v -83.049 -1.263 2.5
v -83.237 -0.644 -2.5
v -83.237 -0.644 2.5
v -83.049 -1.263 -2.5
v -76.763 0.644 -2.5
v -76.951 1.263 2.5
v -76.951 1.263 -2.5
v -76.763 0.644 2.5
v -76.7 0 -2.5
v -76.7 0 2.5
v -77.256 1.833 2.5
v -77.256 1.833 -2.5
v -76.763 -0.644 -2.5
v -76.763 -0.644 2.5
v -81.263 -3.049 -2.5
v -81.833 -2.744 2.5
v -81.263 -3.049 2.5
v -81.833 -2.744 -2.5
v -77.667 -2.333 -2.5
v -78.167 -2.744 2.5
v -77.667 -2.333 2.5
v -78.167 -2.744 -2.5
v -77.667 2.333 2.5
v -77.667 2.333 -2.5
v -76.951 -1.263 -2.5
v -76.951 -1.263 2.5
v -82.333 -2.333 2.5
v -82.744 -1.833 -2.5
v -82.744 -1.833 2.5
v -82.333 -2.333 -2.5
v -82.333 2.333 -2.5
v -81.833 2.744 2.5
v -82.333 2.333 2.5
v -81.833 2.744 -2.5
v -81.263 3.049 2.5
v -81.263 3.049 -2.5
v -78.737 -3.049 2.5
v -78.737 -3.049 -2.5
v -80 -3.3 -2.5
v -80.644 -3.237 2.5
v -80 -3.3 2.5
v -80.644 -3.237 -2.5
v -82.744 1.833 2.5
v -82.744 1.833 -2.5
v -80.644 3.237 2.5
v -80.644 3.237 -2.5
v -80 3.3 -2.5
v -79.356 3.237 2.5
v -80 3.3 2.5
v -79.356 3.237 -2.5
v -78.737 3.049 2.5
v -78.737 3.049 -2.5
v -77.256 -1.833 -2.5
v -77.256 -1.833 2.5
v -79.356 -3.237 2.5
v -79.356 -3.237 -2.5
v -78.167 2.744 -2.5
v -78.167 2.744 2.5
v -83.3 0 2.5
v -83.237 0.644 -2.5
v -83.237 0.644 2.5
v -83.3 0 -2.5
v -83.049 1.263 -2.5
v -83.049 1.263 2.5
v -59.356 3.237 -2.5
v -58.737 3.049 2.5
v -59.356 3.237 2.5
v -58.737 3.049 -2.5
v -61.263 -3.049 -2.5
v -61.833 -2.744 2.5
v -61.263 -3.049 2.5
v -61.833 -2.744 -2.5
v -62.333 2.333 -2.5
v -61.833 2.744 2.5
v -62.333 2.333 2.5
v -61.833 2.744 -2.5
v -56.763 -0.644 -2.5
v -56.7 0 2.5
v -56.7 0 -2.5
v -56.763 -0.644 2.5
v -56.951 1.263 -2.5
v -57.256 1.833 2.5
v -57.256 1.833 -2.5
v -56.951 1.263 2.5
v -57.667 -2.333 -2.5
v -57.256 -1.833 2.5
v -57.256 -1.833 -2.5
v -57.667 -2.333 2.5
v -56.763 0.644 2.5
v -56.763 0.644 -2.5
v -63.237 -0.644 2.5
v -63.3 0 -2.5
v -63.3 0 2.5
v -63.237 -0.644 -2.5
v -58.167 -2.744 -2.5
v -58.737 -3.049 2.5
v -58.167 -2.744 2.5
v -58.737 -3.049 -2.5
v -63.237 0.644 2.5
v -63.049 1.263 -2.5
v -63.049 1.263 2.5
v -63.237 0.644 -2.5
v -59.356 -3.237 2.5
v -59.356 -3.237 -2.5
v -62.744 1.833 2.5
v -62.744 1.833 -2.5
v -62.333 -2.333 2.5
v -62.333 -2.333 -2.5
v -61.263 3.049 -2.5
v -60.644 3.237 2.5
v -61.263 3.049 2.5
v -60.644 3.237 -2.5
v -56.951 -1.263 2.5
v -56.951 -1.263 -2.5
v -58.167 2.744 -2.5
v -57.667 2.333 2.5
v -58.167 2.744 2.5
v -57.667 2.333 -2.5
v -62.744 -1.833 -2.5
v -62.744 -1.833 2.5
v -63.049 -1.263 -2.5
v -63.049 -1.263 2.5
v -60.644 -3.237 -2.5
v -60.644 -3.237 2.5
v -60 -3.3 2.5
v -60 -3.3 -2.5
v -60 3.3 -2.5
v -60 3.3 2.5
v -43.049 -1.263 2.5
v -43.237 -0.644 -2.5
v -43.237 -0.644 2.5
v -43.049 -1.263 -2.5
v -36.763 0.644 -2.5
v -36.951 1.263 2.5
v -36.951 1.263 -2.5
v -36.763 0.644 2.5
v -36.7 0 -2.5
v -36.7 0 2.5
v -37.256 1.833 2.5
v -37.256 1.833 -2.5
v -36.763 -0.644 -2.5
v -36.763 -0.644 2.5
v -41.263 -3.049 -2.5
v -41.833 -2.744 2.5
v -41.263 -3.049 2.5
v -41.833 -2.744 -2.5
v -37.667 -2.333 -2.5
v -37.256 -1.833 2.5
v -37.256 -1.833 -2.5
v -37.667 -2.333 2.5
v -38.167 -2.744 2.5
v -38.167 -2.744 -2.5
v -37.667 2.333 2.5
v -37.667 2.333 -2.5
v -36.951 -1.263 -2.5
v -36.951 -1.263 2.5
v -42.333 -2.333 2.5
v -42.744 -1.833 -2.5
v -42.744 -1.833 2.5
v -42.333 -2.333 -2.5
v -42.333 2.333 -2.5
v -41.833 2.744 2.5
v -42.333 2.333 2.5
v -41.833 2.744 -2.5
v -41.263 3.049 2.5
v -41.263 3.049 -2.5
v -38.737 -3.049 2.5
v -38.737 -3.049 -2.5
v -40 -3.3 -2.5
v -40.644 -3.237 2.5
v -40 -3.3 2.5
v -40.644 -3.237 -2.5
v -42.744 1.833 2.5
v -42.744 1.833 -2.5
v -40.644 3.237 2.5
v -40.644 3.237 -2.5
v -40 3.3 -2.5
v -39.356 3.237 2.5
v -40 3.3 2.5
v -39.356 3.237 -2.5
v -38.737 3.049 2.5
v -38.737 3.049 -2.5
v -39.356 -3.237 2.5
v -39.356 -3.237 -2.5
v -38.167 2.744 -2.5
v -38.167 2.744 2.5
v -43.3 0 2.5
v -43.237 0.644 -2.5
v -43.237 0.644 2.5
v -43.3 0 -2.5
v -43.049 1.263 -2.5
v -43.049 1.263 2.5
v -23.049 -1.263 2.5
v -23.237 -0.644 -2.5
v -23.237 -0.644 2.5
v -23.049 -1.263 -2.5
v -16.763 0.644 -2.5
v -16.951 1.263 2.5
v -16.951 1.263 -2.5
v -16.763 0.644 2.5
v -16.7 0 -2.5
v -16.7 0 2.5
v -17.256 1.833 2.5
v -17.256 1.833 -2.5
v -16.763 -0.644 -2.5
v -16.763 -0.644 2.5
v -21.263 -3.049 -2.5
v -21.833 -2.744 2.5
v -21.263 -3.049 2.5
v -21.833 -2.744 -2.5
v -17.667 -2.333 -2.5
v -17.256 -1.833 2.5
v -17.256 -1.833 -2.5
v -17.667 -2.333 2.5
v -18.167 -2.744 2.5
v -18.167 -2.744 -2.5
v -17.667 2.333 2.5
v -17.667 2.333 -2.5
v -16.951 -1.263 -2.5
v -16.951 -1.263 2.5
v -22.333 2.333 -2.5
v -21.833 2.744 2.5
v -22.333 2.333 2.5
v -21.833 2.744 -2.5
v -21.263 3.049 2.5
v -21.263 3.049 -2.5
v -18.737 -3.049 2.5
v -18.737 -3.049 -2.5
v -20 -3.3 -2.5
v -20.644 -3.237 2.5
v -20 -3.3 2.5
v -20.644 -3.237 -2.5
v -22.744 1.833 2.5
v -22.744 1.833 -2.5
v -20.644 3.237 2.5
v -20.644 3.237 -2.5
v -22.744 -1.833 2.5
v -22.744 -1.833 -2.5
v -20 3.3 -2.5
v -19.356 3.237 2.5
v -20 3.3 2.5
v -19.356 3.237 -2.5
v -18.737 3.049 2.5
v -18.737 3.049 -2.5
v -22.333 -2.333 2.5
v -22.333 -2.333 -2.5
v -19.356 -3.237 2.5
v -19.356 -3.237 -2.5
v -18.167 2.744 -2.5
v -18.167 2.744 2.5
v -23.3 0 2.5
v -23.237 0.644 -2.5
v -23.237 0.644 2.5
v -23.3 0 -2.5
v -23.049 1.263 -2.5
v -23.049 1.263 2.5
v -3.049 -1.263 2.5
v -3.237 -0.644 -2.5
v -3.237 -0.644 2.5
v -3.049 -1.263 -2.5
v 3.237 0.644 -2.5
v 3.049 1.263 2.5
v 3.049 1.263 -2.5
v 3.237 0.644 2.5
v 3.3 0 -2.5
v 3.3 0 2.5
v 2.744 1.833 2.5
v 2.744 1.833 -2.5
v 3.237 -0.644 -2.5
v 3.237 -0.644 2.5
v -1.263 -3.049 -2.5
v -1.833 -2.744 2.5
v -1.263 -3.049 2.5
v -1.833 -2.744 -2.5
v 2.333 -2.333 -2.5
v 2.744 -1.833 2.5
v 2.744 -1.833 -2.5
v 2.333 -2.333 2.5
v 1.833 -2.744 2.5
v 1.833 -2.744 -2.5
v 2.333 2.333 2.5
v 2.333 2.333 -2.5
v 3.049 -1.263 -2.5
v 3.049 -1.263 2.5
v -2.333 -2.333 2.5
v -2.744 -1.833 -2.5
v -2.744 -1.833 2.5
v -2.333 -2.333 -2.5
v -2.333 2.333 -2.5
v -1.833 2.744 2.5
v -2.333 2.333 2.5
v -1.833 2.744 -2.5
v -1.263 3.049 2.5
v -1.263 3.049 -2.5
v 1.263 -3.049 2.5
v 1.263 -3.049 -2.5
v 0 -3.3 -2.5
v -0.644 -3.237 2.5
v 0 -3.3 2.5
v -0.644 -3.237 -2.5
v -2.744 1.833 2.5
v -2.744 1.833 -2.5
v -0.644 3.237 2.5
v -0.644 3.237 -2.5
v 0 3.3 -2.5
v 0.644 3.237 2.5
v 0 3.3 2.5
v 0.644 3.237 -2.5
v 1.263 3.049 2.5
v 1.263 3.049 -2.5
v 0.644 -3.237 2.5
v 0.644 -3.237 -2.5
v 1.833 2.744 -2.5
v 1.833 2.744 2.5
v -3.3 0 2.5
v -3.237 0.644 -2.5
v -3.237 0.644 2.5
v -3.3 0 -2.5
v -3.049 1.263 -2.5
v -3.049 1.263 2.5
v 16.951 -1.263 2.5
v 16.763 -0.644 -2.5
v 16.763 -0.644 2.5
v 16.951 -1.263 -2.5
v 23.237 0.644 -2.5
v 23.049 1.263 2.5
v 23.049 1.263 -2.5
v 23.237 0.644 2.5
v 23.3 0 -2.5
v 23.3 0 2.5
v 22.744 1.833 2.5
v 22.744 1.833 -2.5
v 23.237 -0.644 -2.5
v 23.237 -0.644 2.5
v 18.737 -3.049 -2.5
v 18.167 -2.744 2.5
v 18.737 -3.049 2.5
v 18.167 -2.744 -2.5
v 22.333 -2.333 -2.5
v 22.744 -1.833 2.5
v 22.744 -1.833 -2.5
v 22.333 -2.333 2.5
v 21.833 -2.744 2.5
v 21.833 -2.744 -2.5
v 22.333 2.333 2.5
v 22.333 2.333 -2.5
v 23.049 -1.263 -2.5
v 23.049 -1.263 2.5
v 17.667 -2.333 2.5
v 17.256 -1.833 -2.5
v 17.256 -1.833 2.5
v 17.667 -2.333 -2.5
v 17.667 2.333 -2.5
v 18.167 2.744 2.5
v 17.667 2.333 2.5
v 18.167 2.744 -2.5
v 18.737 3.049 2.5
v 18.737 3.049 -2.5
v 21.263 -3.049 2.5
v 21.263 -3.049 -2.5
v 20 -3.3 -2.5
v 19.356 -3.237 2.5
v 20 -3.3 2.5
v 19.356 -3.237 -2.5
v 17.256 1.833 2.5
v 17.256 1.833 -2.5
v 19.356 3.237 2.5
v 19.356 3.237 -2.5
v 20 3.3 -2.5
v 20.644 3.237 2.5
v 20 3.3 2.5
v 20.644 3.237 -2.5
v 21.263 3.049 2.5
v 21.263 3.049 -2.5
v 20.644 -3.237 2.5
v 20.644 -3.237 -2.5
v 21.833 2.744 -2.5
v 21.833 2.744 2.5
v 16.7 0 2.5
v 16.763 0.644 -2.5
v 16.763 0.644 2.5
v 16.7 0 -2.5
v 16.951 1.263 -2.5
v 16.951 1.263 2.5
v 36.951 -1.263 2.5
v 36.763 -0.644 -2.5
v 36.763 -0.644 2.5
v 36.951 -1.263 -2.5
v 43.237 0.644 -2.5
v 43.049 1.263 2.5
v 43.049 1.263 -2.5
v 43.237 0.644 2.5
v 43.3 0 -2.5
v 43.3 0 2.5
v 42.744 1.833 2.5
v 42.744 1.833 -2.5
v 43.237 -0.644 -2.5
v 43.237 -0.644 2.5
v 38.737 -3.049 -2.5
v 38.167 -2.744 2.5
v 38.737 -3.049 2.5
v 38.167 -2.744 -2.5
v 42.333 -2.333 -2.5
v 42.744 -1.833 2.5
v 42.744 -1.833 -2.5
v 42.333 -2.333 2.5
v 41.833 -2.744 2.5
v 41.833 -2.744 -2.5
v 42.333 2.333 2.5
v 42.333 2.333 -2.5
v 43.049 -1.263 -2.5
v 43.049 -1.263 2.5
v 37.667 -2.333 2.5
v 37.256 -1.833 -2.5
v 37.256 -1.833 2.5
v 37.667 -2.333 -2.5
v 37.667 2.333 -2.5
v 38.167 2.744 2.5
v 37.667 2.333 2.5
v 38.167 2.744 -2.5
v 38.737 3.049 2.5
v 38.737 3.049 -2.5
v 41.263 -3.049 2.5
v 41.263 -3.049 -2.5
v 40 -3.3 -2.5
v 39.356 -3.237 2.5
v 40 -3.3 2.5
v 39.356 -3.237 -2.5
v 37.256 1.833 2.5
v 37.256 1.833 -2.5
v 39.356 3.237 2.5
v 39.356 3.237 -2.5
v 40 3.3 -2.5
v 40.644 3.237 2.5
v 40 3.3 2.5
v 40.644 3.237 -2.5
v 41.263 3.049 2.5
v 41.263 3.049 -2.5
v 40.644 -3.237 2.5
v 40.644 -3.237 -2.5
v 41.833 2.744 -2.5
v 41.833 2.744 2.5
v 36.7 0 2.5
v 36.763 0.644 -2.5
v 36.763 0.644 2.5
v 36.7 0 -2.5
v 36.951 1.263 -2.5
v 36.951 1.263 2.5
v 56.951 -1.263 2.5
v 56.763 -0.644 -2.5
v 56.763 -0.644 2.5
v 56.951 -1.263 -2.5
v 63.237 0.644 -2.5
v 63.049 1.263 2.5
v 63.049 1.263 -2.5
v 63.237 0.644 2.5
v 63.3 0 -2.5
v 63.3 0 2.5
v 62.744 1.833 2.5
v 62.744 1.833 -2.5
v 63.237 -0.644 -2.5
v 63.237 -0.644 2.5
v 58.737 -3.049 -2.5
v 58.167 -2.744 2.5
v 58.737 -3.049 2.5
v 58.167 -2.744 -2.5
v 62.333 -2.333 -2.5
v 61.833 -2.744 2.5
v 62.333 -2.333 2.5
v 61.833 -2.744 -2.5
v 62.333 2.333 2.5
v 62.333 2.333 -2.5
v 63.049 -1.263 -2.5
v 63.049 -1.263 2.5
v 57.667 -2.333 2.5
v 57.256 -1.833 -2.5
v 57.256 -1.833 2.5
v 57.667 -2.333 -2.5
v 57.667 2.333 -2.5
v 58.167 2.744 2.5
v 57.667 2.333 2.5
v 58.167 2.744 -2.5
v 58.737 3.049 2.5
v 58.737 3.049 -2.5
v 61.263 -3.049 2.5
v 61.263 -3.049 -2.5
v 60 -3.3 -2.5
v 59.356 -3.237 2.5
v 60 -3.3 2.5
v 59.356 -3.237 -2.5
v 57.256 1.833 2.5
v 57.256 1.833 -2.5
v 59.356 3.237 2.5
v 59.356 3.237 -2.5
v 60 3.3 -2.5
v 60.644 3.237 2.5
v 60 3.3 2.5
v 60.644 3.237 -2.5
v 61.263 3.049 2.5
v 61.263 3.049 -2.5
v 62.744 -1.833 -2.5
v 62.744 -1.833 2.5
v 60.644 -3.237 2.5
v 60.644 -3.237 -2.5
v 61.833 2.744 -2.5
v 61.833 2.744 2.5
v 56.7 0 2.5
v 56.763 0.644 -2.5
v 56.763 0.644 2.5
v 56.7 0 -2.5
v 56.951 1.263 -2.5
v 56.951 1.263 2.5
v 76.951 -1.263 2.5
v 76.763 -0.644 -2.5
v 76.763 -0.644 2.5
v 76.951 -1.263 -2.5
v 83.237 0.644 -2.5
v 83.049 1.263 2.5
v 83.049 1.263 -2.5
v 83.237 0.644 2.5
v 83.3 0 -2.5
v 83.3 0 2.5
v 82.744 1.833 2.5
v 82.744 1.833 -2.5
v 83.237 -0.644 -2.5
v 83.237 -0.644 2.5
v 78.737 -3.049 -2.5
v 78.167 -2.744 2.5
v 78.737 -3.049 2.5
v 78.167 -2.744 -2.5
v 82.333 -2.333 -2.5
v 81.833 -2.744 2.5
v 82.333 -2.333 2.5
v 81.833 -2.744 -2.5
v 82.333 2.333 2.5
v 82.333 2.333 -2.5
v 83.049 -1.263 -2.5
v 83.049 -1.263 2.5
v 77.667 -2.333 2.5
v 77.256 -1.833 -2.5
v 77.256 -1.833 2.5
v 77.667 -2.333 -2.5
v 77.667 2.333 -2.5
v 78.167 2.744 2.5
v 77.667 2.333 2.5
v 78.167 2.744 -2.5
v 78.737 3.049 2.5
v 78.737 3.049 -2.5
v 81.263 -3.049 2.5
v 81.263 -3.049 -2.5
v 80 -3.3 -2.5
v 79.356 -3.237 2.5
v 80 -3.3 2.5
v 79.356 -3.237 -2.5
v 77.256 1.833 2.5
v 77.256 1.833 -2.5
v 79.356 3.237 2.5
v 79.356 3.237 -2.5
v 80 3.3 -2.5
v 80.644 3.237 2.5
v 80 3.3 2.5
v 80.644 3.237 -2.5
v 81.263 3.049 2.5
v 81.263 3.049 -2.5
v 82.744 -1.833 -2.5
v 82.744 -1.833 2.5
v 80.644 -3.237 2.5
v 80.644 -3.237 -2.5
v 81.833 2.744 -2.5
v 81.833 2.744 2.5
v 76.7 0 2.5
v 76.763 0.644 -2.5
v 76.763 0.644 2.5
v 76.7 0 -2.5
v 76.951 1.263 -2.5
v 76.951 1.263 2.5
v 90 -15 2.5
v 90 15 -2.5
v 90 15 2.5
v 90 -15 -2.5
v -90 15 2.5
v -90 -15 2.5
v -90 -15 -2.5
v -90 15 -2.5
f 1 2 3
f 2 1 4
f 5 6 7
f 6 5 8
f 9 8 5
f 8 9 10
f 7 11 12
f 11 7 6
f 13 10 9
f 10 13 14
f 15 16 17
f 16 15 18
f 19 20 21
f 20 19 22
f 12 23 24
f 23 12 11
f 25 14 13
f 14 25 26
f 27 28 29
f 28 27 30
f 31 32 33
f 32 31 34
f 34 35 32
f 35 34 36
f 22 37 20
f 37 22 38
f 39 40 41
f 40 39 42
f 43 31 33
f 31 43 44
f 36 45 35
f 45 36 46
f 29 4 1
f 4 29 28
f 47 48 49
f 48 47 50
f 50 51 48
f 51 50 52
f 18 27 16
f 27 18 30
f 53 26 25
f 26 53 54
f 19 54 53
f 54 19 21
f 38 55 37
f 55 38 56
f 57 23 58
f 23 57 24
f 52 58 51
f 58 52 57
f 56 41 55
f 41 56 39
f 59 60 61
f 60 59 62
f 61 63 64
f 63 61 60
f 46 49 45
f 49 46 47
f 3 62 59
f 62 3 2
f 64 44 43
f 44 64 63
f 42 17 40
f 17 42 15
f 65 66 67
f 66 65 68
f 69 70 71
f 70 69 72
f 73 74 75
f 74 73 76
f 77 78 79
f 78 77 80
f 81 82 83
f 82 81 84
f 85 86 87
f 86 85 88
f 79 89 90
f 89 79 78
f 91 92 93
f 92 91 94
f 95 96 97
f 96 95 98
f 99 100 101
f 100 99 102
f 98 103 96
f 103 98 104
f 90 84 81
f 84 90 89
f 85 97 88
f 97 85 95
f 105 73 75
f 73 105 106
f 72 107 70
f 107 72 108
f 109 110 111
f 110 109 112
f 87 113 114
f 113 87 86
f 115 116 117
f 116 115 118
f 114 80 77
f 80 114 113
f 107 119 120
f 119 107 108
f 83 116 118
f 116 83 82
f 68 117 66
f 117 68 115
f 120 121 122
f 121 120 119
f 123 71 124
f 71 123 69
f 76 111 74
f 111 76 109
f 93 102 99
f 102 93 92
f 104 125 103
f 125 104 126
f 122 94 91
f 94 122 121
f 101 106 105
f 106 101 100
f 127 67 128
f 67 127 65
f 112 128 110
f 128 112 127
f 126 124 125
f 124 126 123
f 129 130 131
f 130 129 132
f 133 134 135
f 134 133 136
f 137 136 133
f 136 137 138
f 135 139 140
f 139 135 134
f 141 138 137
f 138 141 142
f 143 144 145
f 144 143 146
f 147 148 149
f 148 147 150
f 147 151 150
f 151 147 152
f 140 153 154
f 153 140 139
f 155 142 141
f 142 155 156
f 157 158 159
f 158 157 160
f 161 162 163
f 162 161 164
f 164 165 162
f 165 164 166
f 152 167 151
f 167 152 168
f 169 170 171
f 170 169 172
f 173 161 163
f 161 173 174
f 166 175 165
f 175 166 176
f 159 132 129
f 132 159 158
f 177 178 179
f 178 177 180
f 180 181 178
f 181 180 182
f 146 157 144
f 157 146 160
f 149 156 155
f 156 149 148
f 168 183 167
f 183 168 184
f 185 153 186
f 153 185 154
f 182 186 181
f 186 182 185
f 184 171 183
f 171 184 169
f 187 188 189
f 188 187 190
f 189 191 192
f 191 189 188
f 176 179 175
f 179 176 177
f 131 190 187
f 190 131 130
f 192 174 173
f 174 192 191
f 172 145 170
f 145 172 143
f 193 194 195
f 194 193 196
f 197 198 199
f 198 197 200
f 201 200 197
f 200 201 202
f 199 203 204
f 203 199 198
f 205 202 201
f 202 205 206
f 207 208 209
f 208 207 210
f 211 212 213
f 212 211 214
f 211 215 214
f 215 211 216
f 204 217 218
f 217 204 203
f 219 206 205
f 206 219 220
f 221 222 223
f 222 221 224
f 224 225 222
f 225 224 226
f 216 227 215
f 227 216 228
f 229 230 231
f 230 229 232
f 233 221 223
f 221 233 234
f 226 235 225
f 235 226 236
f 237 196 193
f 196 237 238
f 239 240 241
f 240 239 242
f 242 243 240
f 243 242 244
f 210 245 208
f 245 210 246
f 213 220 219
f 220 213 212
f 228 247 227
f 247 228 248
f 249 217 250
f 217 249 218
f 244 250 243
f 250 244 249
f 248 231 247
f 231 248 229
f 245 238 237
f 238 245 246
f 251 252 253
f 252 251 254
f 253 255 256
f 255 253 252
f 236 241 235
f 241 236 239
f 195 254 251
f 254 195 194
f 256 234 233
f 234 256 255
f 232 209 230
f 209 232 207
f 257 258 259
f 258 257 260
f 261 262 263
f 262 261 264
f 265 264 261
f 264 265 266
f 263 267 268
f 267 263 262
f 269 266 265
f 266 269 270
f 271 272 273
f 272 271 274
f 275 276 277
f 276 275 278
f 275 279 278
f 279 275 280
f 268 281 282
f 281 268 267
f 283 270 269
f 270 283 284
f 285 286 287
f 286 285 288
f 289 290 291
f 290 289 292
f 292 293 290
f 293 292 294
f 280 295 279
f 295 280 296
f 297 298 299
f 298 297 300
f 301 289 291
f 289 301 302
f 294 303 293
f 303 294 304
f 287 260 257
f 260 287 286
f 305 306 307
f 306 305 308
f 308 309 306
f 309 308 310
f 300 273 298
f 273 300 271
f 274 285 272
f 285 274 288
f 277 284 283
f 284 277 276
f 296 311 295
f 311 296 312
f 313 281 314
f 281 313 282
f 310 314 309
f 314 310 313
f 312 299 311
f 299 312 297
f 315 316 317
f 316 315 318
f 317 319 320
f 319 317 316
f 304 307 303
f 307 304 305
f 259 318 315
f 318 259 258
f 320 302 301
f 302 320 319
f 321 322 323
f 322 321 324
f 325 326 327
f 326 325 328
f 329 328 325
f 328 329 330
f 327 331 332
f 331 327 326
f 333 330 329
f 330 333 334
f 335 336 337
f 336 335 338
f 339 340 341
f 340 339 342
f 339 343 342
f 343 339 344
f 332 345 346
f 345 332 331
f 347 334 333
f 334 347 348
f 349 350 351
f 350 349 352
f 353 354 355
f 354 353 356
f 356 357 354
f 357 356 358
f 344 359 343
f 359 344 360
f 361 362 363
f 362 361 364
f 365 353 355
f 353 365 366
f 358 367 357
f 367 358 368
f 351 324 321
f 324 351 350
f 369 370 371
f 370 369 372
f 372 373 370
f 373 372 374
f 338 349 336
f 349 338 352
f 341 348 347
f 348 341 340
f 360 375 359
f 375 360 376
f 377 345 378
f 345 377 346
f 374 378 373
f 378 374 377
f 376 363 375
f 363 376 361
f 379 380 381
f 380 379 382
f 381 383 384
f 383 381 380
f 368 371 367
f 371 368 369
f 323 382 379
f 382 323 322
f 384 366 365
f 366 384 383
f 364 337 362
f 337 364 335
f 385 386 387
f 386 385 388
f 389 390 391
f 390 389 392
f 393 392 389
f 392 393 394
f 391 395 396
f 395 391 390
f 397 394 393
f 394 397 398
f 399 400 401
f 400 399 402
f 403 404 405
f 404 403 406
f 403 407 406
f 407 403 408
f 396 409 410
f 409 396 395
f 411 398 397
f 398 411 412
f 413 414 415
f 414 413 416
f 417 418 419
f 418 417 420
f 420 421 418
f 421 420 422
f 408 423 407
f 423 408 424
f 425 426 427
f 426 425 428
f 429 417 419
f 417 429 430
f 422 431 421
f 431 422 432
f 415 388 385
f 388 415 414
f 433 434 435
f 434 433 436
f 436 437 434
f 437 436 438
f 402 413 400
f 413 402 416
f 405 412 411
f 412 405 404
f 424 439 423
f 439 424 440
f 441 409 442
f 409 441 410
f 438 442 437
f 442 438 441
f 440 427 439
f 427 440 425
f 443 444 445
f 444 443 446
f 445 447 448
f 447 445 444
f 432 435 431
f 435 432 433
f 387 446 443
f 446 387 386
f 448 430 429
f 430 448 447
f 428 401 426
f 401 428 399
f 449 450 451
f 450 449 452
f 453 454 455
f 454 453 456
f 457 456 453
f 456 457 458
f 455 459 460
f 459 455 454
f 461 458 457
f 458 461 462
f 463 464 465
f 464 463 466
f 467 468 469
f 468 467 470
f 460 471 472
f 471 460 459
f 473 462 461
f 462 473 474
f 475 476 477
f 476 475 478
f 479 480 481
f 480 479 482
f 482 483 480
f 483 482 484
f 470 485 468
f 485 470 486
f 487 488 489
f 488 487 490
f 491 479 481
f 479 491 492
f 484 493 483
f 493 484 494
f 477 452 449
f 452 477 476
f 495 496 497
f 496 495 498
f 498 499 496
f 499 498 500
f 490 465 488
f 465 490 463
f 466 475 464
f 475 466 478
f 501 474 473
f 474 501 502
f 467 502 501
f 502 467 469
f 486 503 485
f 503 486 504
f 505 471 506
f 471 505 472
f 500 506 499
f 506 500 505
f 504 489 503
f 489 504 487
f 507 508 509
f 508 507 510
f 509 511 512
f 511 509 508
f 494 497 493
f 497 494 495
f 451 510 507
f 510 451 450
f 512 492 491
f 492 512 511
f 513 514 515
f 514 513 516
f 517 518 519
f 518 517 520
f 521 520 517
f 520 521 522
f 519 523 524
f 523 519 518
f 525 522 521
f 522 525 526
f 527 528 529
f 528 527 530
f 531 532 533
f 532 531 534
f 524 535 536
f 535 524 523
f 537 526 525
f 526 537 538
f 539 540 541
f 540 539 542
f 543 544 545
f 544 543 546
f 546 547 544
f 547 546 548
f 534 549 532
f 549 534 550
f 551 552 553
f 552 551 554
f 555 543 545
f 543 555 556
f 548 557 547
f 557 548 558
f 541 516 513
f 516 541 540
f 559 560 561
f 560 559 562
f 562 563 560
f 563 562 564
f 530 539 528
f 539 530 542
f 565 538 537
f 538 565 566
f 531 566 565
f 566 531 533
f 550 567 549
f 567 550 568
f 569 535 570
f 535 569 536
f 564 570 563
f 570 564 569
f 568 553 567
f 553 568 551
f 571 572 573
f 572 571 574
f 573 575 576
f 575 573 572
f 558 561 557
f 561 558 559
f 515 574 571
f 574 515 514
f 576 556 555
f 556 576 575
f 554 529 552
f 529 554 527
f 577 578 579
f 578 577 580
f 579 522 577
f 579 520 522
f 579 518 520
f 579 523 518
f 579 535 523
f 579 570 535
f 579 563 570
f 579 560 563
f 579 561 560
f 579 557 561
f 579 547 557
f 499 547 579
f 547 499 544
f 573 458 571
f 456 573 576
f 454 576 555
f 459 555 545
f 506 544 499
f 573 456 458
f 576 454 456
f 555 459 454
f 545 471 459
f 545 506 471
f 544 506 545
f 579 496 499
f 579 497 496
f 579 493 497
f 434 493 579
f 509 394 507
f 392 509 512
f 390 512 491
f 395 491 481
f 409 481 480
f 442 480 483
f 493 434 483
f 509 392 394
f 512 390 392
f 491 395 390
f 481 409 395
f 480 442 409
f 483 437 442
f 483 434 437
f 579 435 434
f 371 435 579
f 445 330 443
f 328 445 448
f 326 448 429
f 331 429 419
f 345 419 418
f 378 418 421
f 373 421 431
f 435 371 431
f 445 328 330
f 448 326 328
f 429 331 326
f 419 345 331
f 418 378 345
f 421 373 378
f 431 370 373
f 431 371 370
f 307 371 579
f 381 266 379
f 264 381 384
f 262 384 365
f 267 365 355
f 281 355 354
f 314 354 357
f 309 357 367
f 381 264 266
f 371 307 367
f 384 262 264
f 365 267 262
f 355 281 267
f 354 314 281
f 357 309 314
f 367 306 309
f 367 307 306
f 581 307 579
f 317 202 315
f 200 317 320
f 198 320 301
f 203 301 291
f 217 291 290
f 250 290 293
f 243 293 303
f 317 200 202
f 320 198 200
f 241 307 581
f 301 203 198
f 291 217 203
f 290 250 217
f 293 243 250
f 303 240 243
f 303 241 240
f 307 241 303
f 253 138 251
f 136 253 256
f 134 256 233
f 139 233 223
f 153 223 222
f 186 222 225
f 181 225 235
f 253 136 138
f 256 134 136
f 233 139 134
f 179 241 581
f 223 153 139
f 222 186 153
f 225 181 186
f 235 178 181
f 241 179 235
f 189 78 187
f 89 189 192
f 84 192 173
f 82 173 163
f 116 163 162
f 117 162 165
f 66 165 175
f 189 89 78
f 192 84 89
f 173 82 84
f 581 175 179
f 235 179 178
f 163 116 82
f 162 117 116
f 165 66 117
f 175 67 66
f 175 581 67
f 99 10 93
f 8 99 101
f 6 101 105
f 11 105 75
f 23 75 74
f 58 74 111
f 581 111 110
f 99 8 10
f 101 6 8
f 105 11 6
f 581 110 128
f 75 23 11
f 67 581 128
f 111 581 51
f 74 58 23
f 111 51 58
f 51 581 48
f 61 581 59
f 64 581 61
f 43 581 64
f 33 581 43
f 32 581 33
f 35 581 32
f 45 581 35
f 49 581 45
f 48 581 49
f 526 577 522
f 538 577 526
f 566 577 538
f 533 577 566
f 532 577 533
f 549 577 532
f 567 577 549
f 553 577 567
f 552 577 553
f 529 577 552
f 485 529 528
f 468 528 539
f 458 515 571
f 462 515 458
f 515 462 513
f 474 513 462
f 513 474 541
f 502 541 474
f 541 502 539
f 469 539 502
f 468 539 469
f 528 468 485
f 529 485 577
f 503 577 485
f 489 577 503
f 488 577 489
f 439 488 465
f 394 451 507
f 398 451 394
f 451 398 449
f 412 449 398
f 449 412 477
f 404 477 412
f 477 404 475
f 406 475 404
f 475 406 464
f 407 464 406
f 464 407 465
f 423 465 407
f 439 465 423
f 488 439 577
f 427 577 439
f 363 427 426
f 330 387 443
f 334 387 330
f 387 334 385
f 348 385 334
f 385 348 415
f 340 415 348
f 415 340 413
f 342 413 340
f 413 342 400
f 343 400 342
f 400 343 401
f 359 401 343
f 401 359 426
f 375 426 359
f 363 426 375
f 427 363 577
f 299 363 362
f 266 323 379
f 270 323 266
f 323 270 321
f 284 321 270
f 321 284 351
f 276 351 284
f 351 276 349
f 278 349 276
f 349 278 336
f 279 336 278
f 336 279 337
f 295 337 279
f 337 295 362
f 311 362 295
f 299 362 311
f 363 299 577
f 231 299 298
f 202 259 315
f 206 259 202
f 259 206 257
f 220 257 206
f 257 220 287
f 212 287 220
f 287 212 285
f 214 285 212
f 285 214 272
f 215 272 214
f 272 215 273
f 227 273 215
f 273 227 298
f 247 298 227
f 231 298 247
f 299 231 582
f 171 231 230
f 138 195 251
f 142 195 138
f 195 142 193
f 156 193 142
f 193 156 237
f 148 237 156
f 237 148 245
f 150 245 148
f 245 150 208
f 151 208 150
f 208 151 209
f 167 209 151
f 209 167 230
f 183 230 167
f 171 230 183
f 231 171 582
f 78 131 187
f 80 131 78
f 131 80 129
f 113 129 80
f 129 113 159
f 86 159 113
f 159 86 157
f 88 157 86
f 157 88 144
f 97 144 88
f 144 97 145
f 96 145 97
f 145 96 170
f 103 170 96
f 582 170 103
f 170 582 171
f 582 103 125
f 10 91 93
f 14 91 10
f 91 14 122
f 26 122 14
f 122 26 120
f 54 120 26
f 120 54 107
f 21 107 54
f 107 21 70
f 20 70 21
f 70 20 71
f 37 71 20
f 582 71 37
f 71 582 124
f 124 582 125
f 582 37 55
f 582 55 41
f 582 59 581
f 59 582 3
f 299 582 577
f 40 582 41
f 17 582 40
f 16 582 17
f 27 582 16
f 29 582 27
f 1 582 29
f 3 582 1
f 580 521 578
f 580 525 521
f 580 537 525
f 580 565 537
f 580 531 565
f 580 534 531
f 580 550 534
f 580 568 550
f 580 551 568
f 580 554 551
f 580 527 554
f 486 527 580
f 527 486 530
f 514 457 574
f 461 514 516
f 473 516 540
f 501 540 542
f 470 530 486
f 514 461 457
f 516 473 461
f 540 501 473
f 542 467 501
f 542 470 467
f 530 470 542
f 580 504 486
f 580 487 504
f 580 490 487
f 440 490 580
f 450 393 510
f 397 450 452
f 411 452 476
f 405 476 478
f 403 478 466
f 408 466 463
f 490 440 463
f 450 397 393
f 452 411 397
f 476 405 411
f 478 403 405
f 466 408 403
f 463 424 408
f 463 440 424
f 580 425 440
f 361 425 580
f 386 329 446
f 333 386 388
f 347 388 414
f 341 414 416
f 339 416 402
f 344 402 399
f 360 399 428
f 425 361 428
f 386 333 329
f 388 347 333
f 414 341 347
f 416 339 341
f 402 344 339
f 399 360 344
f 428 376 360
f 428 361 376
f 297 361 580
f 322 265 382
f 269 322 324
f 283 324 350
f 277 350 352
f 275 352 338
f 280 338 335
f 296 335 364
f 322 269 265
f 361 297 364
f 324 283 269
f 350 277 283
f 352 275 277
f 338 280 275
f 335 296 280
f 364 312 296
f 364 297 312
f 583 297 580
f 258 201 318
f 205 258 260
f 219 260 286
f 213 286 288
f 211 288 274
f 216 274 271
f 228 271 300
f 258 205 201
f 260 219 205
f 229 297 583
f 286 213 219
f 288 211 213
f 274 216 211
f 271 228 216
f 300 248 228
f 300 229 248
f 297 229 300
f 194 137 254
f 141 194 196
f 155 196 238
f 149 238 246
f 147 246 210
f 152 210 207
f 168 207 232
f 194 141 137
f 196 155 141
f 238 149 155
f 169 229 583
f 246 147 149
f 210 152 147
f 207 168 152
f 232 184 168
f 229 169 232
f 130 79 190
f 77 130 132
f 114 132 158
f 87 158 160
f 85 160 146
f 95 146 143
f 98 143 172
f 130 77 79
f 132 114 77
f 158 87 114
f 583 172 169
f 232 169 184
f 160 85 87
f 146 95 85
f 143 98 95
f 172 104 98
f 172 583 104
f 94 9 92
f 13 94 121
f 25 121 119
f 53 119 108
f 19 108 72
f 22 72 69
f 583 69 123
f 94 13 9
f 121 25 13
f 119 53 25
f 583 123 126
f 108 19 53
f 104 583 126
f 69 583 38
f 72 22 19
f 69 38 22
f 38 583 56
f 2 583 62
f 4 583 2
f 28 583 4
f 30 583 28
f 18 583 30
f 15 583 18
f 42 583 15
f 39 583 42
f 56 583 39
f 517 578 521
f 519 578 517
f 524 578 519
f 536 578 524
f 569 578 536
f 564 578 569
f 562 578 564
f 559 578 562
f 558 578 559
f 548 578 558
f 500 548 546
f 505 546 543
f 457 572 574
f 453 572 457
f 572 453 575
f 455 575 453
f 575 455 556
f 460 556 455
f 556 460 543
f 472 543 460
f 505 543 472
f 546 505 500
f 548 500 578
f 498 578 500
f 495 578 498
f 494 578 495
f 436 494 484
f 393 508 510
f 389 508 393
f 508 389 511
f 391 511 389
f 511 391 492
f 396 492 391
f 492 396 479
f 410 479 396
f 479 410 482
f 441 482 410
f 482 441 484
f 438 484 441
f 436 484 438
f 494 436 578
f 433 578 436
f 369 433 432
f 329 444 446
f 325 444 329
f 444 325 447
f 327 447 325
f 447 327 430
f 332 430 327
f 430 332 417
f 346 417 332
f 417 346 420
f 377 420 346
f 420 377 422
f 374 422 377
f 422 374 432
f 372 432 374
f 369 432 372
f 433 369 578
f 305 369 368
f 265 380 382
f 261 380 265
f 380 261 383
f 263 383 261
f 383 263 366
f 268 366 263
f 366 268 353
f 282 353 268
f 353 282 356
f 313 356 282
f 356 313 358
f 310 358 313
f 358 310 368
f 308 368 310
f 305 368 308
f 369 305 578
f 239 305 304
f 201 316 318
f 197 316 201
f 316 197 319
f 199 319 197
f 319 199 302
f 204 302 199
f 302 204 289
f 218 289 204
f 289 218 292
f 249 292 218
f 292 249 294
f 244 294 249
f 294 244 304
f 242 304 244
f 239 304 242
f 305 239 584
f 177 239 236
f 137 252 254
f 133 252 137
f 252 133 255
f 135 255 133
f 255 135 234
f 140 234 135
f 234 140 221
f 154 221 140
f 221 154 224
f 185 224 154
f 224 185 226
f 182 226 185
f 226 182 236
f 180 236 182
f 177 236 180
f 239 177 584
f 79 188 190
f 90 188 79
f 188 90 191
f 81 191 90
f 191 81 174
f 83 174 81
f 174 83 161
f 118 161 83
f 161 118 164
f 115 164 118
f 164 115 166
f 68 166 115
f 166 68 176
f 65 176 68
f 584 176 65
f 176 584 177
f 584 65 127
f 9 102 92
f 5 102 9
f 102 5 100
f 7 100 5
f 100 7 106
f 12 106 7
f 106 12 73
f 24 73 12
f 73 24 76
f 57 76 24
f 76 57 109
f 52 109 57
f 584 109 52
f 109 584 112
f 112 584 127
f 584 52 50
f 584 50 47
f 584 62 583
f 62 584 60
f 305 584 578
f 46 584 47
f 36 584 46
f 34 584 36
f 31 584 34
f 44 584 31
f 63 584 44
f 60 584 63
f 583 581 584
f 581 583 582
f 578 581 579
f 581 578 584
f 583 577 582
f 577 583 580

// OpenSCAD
$fn = 32;

// ----------------------------------------------------------------------
// Hole bar, 9 x Ø6.6
// skip layout, 10 mm edge offset
// ----------------------------------------------------------------------

// --- parameters (mm) ---
bar_w = 30;       // bar width (Y)
bar_t = 5;        // bar thickness (Z)
holes = 9;        // holes per row
hole_d = 6.6;     // hole diameter
edge = 10;        // offset from the bar end to the first hole
grid_pitch = 10;  // grid the bar was laid out on

// --- derived feature positions (mm) ---
pitch = grid_pitch * 2;       // = 20   holes sit every other grid slot
span = (holes - 1) * pitch;   // = 160   distance between the end holes
bar_l = span + 2 * edge;      // = 180   overall bar length
start_x = -bar_l / 2 + edge;  // = -80   X of the first hole
feature_centers = [
  [start_x + 0 * pitch, 0],
  [start_x + 1 * pitch, 0],
  [start_x + 2 * pitch, 0],
  [start_x + 3 * pitch, 0],
  [start_x + 4 * pitch, 0],
  [start_x + 5 * pitch, 0],
  [start_x + 6 * pitch, 0],
  [start_x + 7 * pitch, 0],
  [start_x + 8 * pitch, 0]
];   // hole centres of the first row

// bar with one row of holes, drilled from feature_centers
difference() {
  translate([-bar_l / 2, -bar_w / 2, -bar_t / 2]) cube([bar_l, bar_w, bar_t]);
  for (centre = feature_centers)
    translate([centre[0], centre[1], 0])
      cylinder(d = hole_d, h = bar_t + 2, center = true);
}
